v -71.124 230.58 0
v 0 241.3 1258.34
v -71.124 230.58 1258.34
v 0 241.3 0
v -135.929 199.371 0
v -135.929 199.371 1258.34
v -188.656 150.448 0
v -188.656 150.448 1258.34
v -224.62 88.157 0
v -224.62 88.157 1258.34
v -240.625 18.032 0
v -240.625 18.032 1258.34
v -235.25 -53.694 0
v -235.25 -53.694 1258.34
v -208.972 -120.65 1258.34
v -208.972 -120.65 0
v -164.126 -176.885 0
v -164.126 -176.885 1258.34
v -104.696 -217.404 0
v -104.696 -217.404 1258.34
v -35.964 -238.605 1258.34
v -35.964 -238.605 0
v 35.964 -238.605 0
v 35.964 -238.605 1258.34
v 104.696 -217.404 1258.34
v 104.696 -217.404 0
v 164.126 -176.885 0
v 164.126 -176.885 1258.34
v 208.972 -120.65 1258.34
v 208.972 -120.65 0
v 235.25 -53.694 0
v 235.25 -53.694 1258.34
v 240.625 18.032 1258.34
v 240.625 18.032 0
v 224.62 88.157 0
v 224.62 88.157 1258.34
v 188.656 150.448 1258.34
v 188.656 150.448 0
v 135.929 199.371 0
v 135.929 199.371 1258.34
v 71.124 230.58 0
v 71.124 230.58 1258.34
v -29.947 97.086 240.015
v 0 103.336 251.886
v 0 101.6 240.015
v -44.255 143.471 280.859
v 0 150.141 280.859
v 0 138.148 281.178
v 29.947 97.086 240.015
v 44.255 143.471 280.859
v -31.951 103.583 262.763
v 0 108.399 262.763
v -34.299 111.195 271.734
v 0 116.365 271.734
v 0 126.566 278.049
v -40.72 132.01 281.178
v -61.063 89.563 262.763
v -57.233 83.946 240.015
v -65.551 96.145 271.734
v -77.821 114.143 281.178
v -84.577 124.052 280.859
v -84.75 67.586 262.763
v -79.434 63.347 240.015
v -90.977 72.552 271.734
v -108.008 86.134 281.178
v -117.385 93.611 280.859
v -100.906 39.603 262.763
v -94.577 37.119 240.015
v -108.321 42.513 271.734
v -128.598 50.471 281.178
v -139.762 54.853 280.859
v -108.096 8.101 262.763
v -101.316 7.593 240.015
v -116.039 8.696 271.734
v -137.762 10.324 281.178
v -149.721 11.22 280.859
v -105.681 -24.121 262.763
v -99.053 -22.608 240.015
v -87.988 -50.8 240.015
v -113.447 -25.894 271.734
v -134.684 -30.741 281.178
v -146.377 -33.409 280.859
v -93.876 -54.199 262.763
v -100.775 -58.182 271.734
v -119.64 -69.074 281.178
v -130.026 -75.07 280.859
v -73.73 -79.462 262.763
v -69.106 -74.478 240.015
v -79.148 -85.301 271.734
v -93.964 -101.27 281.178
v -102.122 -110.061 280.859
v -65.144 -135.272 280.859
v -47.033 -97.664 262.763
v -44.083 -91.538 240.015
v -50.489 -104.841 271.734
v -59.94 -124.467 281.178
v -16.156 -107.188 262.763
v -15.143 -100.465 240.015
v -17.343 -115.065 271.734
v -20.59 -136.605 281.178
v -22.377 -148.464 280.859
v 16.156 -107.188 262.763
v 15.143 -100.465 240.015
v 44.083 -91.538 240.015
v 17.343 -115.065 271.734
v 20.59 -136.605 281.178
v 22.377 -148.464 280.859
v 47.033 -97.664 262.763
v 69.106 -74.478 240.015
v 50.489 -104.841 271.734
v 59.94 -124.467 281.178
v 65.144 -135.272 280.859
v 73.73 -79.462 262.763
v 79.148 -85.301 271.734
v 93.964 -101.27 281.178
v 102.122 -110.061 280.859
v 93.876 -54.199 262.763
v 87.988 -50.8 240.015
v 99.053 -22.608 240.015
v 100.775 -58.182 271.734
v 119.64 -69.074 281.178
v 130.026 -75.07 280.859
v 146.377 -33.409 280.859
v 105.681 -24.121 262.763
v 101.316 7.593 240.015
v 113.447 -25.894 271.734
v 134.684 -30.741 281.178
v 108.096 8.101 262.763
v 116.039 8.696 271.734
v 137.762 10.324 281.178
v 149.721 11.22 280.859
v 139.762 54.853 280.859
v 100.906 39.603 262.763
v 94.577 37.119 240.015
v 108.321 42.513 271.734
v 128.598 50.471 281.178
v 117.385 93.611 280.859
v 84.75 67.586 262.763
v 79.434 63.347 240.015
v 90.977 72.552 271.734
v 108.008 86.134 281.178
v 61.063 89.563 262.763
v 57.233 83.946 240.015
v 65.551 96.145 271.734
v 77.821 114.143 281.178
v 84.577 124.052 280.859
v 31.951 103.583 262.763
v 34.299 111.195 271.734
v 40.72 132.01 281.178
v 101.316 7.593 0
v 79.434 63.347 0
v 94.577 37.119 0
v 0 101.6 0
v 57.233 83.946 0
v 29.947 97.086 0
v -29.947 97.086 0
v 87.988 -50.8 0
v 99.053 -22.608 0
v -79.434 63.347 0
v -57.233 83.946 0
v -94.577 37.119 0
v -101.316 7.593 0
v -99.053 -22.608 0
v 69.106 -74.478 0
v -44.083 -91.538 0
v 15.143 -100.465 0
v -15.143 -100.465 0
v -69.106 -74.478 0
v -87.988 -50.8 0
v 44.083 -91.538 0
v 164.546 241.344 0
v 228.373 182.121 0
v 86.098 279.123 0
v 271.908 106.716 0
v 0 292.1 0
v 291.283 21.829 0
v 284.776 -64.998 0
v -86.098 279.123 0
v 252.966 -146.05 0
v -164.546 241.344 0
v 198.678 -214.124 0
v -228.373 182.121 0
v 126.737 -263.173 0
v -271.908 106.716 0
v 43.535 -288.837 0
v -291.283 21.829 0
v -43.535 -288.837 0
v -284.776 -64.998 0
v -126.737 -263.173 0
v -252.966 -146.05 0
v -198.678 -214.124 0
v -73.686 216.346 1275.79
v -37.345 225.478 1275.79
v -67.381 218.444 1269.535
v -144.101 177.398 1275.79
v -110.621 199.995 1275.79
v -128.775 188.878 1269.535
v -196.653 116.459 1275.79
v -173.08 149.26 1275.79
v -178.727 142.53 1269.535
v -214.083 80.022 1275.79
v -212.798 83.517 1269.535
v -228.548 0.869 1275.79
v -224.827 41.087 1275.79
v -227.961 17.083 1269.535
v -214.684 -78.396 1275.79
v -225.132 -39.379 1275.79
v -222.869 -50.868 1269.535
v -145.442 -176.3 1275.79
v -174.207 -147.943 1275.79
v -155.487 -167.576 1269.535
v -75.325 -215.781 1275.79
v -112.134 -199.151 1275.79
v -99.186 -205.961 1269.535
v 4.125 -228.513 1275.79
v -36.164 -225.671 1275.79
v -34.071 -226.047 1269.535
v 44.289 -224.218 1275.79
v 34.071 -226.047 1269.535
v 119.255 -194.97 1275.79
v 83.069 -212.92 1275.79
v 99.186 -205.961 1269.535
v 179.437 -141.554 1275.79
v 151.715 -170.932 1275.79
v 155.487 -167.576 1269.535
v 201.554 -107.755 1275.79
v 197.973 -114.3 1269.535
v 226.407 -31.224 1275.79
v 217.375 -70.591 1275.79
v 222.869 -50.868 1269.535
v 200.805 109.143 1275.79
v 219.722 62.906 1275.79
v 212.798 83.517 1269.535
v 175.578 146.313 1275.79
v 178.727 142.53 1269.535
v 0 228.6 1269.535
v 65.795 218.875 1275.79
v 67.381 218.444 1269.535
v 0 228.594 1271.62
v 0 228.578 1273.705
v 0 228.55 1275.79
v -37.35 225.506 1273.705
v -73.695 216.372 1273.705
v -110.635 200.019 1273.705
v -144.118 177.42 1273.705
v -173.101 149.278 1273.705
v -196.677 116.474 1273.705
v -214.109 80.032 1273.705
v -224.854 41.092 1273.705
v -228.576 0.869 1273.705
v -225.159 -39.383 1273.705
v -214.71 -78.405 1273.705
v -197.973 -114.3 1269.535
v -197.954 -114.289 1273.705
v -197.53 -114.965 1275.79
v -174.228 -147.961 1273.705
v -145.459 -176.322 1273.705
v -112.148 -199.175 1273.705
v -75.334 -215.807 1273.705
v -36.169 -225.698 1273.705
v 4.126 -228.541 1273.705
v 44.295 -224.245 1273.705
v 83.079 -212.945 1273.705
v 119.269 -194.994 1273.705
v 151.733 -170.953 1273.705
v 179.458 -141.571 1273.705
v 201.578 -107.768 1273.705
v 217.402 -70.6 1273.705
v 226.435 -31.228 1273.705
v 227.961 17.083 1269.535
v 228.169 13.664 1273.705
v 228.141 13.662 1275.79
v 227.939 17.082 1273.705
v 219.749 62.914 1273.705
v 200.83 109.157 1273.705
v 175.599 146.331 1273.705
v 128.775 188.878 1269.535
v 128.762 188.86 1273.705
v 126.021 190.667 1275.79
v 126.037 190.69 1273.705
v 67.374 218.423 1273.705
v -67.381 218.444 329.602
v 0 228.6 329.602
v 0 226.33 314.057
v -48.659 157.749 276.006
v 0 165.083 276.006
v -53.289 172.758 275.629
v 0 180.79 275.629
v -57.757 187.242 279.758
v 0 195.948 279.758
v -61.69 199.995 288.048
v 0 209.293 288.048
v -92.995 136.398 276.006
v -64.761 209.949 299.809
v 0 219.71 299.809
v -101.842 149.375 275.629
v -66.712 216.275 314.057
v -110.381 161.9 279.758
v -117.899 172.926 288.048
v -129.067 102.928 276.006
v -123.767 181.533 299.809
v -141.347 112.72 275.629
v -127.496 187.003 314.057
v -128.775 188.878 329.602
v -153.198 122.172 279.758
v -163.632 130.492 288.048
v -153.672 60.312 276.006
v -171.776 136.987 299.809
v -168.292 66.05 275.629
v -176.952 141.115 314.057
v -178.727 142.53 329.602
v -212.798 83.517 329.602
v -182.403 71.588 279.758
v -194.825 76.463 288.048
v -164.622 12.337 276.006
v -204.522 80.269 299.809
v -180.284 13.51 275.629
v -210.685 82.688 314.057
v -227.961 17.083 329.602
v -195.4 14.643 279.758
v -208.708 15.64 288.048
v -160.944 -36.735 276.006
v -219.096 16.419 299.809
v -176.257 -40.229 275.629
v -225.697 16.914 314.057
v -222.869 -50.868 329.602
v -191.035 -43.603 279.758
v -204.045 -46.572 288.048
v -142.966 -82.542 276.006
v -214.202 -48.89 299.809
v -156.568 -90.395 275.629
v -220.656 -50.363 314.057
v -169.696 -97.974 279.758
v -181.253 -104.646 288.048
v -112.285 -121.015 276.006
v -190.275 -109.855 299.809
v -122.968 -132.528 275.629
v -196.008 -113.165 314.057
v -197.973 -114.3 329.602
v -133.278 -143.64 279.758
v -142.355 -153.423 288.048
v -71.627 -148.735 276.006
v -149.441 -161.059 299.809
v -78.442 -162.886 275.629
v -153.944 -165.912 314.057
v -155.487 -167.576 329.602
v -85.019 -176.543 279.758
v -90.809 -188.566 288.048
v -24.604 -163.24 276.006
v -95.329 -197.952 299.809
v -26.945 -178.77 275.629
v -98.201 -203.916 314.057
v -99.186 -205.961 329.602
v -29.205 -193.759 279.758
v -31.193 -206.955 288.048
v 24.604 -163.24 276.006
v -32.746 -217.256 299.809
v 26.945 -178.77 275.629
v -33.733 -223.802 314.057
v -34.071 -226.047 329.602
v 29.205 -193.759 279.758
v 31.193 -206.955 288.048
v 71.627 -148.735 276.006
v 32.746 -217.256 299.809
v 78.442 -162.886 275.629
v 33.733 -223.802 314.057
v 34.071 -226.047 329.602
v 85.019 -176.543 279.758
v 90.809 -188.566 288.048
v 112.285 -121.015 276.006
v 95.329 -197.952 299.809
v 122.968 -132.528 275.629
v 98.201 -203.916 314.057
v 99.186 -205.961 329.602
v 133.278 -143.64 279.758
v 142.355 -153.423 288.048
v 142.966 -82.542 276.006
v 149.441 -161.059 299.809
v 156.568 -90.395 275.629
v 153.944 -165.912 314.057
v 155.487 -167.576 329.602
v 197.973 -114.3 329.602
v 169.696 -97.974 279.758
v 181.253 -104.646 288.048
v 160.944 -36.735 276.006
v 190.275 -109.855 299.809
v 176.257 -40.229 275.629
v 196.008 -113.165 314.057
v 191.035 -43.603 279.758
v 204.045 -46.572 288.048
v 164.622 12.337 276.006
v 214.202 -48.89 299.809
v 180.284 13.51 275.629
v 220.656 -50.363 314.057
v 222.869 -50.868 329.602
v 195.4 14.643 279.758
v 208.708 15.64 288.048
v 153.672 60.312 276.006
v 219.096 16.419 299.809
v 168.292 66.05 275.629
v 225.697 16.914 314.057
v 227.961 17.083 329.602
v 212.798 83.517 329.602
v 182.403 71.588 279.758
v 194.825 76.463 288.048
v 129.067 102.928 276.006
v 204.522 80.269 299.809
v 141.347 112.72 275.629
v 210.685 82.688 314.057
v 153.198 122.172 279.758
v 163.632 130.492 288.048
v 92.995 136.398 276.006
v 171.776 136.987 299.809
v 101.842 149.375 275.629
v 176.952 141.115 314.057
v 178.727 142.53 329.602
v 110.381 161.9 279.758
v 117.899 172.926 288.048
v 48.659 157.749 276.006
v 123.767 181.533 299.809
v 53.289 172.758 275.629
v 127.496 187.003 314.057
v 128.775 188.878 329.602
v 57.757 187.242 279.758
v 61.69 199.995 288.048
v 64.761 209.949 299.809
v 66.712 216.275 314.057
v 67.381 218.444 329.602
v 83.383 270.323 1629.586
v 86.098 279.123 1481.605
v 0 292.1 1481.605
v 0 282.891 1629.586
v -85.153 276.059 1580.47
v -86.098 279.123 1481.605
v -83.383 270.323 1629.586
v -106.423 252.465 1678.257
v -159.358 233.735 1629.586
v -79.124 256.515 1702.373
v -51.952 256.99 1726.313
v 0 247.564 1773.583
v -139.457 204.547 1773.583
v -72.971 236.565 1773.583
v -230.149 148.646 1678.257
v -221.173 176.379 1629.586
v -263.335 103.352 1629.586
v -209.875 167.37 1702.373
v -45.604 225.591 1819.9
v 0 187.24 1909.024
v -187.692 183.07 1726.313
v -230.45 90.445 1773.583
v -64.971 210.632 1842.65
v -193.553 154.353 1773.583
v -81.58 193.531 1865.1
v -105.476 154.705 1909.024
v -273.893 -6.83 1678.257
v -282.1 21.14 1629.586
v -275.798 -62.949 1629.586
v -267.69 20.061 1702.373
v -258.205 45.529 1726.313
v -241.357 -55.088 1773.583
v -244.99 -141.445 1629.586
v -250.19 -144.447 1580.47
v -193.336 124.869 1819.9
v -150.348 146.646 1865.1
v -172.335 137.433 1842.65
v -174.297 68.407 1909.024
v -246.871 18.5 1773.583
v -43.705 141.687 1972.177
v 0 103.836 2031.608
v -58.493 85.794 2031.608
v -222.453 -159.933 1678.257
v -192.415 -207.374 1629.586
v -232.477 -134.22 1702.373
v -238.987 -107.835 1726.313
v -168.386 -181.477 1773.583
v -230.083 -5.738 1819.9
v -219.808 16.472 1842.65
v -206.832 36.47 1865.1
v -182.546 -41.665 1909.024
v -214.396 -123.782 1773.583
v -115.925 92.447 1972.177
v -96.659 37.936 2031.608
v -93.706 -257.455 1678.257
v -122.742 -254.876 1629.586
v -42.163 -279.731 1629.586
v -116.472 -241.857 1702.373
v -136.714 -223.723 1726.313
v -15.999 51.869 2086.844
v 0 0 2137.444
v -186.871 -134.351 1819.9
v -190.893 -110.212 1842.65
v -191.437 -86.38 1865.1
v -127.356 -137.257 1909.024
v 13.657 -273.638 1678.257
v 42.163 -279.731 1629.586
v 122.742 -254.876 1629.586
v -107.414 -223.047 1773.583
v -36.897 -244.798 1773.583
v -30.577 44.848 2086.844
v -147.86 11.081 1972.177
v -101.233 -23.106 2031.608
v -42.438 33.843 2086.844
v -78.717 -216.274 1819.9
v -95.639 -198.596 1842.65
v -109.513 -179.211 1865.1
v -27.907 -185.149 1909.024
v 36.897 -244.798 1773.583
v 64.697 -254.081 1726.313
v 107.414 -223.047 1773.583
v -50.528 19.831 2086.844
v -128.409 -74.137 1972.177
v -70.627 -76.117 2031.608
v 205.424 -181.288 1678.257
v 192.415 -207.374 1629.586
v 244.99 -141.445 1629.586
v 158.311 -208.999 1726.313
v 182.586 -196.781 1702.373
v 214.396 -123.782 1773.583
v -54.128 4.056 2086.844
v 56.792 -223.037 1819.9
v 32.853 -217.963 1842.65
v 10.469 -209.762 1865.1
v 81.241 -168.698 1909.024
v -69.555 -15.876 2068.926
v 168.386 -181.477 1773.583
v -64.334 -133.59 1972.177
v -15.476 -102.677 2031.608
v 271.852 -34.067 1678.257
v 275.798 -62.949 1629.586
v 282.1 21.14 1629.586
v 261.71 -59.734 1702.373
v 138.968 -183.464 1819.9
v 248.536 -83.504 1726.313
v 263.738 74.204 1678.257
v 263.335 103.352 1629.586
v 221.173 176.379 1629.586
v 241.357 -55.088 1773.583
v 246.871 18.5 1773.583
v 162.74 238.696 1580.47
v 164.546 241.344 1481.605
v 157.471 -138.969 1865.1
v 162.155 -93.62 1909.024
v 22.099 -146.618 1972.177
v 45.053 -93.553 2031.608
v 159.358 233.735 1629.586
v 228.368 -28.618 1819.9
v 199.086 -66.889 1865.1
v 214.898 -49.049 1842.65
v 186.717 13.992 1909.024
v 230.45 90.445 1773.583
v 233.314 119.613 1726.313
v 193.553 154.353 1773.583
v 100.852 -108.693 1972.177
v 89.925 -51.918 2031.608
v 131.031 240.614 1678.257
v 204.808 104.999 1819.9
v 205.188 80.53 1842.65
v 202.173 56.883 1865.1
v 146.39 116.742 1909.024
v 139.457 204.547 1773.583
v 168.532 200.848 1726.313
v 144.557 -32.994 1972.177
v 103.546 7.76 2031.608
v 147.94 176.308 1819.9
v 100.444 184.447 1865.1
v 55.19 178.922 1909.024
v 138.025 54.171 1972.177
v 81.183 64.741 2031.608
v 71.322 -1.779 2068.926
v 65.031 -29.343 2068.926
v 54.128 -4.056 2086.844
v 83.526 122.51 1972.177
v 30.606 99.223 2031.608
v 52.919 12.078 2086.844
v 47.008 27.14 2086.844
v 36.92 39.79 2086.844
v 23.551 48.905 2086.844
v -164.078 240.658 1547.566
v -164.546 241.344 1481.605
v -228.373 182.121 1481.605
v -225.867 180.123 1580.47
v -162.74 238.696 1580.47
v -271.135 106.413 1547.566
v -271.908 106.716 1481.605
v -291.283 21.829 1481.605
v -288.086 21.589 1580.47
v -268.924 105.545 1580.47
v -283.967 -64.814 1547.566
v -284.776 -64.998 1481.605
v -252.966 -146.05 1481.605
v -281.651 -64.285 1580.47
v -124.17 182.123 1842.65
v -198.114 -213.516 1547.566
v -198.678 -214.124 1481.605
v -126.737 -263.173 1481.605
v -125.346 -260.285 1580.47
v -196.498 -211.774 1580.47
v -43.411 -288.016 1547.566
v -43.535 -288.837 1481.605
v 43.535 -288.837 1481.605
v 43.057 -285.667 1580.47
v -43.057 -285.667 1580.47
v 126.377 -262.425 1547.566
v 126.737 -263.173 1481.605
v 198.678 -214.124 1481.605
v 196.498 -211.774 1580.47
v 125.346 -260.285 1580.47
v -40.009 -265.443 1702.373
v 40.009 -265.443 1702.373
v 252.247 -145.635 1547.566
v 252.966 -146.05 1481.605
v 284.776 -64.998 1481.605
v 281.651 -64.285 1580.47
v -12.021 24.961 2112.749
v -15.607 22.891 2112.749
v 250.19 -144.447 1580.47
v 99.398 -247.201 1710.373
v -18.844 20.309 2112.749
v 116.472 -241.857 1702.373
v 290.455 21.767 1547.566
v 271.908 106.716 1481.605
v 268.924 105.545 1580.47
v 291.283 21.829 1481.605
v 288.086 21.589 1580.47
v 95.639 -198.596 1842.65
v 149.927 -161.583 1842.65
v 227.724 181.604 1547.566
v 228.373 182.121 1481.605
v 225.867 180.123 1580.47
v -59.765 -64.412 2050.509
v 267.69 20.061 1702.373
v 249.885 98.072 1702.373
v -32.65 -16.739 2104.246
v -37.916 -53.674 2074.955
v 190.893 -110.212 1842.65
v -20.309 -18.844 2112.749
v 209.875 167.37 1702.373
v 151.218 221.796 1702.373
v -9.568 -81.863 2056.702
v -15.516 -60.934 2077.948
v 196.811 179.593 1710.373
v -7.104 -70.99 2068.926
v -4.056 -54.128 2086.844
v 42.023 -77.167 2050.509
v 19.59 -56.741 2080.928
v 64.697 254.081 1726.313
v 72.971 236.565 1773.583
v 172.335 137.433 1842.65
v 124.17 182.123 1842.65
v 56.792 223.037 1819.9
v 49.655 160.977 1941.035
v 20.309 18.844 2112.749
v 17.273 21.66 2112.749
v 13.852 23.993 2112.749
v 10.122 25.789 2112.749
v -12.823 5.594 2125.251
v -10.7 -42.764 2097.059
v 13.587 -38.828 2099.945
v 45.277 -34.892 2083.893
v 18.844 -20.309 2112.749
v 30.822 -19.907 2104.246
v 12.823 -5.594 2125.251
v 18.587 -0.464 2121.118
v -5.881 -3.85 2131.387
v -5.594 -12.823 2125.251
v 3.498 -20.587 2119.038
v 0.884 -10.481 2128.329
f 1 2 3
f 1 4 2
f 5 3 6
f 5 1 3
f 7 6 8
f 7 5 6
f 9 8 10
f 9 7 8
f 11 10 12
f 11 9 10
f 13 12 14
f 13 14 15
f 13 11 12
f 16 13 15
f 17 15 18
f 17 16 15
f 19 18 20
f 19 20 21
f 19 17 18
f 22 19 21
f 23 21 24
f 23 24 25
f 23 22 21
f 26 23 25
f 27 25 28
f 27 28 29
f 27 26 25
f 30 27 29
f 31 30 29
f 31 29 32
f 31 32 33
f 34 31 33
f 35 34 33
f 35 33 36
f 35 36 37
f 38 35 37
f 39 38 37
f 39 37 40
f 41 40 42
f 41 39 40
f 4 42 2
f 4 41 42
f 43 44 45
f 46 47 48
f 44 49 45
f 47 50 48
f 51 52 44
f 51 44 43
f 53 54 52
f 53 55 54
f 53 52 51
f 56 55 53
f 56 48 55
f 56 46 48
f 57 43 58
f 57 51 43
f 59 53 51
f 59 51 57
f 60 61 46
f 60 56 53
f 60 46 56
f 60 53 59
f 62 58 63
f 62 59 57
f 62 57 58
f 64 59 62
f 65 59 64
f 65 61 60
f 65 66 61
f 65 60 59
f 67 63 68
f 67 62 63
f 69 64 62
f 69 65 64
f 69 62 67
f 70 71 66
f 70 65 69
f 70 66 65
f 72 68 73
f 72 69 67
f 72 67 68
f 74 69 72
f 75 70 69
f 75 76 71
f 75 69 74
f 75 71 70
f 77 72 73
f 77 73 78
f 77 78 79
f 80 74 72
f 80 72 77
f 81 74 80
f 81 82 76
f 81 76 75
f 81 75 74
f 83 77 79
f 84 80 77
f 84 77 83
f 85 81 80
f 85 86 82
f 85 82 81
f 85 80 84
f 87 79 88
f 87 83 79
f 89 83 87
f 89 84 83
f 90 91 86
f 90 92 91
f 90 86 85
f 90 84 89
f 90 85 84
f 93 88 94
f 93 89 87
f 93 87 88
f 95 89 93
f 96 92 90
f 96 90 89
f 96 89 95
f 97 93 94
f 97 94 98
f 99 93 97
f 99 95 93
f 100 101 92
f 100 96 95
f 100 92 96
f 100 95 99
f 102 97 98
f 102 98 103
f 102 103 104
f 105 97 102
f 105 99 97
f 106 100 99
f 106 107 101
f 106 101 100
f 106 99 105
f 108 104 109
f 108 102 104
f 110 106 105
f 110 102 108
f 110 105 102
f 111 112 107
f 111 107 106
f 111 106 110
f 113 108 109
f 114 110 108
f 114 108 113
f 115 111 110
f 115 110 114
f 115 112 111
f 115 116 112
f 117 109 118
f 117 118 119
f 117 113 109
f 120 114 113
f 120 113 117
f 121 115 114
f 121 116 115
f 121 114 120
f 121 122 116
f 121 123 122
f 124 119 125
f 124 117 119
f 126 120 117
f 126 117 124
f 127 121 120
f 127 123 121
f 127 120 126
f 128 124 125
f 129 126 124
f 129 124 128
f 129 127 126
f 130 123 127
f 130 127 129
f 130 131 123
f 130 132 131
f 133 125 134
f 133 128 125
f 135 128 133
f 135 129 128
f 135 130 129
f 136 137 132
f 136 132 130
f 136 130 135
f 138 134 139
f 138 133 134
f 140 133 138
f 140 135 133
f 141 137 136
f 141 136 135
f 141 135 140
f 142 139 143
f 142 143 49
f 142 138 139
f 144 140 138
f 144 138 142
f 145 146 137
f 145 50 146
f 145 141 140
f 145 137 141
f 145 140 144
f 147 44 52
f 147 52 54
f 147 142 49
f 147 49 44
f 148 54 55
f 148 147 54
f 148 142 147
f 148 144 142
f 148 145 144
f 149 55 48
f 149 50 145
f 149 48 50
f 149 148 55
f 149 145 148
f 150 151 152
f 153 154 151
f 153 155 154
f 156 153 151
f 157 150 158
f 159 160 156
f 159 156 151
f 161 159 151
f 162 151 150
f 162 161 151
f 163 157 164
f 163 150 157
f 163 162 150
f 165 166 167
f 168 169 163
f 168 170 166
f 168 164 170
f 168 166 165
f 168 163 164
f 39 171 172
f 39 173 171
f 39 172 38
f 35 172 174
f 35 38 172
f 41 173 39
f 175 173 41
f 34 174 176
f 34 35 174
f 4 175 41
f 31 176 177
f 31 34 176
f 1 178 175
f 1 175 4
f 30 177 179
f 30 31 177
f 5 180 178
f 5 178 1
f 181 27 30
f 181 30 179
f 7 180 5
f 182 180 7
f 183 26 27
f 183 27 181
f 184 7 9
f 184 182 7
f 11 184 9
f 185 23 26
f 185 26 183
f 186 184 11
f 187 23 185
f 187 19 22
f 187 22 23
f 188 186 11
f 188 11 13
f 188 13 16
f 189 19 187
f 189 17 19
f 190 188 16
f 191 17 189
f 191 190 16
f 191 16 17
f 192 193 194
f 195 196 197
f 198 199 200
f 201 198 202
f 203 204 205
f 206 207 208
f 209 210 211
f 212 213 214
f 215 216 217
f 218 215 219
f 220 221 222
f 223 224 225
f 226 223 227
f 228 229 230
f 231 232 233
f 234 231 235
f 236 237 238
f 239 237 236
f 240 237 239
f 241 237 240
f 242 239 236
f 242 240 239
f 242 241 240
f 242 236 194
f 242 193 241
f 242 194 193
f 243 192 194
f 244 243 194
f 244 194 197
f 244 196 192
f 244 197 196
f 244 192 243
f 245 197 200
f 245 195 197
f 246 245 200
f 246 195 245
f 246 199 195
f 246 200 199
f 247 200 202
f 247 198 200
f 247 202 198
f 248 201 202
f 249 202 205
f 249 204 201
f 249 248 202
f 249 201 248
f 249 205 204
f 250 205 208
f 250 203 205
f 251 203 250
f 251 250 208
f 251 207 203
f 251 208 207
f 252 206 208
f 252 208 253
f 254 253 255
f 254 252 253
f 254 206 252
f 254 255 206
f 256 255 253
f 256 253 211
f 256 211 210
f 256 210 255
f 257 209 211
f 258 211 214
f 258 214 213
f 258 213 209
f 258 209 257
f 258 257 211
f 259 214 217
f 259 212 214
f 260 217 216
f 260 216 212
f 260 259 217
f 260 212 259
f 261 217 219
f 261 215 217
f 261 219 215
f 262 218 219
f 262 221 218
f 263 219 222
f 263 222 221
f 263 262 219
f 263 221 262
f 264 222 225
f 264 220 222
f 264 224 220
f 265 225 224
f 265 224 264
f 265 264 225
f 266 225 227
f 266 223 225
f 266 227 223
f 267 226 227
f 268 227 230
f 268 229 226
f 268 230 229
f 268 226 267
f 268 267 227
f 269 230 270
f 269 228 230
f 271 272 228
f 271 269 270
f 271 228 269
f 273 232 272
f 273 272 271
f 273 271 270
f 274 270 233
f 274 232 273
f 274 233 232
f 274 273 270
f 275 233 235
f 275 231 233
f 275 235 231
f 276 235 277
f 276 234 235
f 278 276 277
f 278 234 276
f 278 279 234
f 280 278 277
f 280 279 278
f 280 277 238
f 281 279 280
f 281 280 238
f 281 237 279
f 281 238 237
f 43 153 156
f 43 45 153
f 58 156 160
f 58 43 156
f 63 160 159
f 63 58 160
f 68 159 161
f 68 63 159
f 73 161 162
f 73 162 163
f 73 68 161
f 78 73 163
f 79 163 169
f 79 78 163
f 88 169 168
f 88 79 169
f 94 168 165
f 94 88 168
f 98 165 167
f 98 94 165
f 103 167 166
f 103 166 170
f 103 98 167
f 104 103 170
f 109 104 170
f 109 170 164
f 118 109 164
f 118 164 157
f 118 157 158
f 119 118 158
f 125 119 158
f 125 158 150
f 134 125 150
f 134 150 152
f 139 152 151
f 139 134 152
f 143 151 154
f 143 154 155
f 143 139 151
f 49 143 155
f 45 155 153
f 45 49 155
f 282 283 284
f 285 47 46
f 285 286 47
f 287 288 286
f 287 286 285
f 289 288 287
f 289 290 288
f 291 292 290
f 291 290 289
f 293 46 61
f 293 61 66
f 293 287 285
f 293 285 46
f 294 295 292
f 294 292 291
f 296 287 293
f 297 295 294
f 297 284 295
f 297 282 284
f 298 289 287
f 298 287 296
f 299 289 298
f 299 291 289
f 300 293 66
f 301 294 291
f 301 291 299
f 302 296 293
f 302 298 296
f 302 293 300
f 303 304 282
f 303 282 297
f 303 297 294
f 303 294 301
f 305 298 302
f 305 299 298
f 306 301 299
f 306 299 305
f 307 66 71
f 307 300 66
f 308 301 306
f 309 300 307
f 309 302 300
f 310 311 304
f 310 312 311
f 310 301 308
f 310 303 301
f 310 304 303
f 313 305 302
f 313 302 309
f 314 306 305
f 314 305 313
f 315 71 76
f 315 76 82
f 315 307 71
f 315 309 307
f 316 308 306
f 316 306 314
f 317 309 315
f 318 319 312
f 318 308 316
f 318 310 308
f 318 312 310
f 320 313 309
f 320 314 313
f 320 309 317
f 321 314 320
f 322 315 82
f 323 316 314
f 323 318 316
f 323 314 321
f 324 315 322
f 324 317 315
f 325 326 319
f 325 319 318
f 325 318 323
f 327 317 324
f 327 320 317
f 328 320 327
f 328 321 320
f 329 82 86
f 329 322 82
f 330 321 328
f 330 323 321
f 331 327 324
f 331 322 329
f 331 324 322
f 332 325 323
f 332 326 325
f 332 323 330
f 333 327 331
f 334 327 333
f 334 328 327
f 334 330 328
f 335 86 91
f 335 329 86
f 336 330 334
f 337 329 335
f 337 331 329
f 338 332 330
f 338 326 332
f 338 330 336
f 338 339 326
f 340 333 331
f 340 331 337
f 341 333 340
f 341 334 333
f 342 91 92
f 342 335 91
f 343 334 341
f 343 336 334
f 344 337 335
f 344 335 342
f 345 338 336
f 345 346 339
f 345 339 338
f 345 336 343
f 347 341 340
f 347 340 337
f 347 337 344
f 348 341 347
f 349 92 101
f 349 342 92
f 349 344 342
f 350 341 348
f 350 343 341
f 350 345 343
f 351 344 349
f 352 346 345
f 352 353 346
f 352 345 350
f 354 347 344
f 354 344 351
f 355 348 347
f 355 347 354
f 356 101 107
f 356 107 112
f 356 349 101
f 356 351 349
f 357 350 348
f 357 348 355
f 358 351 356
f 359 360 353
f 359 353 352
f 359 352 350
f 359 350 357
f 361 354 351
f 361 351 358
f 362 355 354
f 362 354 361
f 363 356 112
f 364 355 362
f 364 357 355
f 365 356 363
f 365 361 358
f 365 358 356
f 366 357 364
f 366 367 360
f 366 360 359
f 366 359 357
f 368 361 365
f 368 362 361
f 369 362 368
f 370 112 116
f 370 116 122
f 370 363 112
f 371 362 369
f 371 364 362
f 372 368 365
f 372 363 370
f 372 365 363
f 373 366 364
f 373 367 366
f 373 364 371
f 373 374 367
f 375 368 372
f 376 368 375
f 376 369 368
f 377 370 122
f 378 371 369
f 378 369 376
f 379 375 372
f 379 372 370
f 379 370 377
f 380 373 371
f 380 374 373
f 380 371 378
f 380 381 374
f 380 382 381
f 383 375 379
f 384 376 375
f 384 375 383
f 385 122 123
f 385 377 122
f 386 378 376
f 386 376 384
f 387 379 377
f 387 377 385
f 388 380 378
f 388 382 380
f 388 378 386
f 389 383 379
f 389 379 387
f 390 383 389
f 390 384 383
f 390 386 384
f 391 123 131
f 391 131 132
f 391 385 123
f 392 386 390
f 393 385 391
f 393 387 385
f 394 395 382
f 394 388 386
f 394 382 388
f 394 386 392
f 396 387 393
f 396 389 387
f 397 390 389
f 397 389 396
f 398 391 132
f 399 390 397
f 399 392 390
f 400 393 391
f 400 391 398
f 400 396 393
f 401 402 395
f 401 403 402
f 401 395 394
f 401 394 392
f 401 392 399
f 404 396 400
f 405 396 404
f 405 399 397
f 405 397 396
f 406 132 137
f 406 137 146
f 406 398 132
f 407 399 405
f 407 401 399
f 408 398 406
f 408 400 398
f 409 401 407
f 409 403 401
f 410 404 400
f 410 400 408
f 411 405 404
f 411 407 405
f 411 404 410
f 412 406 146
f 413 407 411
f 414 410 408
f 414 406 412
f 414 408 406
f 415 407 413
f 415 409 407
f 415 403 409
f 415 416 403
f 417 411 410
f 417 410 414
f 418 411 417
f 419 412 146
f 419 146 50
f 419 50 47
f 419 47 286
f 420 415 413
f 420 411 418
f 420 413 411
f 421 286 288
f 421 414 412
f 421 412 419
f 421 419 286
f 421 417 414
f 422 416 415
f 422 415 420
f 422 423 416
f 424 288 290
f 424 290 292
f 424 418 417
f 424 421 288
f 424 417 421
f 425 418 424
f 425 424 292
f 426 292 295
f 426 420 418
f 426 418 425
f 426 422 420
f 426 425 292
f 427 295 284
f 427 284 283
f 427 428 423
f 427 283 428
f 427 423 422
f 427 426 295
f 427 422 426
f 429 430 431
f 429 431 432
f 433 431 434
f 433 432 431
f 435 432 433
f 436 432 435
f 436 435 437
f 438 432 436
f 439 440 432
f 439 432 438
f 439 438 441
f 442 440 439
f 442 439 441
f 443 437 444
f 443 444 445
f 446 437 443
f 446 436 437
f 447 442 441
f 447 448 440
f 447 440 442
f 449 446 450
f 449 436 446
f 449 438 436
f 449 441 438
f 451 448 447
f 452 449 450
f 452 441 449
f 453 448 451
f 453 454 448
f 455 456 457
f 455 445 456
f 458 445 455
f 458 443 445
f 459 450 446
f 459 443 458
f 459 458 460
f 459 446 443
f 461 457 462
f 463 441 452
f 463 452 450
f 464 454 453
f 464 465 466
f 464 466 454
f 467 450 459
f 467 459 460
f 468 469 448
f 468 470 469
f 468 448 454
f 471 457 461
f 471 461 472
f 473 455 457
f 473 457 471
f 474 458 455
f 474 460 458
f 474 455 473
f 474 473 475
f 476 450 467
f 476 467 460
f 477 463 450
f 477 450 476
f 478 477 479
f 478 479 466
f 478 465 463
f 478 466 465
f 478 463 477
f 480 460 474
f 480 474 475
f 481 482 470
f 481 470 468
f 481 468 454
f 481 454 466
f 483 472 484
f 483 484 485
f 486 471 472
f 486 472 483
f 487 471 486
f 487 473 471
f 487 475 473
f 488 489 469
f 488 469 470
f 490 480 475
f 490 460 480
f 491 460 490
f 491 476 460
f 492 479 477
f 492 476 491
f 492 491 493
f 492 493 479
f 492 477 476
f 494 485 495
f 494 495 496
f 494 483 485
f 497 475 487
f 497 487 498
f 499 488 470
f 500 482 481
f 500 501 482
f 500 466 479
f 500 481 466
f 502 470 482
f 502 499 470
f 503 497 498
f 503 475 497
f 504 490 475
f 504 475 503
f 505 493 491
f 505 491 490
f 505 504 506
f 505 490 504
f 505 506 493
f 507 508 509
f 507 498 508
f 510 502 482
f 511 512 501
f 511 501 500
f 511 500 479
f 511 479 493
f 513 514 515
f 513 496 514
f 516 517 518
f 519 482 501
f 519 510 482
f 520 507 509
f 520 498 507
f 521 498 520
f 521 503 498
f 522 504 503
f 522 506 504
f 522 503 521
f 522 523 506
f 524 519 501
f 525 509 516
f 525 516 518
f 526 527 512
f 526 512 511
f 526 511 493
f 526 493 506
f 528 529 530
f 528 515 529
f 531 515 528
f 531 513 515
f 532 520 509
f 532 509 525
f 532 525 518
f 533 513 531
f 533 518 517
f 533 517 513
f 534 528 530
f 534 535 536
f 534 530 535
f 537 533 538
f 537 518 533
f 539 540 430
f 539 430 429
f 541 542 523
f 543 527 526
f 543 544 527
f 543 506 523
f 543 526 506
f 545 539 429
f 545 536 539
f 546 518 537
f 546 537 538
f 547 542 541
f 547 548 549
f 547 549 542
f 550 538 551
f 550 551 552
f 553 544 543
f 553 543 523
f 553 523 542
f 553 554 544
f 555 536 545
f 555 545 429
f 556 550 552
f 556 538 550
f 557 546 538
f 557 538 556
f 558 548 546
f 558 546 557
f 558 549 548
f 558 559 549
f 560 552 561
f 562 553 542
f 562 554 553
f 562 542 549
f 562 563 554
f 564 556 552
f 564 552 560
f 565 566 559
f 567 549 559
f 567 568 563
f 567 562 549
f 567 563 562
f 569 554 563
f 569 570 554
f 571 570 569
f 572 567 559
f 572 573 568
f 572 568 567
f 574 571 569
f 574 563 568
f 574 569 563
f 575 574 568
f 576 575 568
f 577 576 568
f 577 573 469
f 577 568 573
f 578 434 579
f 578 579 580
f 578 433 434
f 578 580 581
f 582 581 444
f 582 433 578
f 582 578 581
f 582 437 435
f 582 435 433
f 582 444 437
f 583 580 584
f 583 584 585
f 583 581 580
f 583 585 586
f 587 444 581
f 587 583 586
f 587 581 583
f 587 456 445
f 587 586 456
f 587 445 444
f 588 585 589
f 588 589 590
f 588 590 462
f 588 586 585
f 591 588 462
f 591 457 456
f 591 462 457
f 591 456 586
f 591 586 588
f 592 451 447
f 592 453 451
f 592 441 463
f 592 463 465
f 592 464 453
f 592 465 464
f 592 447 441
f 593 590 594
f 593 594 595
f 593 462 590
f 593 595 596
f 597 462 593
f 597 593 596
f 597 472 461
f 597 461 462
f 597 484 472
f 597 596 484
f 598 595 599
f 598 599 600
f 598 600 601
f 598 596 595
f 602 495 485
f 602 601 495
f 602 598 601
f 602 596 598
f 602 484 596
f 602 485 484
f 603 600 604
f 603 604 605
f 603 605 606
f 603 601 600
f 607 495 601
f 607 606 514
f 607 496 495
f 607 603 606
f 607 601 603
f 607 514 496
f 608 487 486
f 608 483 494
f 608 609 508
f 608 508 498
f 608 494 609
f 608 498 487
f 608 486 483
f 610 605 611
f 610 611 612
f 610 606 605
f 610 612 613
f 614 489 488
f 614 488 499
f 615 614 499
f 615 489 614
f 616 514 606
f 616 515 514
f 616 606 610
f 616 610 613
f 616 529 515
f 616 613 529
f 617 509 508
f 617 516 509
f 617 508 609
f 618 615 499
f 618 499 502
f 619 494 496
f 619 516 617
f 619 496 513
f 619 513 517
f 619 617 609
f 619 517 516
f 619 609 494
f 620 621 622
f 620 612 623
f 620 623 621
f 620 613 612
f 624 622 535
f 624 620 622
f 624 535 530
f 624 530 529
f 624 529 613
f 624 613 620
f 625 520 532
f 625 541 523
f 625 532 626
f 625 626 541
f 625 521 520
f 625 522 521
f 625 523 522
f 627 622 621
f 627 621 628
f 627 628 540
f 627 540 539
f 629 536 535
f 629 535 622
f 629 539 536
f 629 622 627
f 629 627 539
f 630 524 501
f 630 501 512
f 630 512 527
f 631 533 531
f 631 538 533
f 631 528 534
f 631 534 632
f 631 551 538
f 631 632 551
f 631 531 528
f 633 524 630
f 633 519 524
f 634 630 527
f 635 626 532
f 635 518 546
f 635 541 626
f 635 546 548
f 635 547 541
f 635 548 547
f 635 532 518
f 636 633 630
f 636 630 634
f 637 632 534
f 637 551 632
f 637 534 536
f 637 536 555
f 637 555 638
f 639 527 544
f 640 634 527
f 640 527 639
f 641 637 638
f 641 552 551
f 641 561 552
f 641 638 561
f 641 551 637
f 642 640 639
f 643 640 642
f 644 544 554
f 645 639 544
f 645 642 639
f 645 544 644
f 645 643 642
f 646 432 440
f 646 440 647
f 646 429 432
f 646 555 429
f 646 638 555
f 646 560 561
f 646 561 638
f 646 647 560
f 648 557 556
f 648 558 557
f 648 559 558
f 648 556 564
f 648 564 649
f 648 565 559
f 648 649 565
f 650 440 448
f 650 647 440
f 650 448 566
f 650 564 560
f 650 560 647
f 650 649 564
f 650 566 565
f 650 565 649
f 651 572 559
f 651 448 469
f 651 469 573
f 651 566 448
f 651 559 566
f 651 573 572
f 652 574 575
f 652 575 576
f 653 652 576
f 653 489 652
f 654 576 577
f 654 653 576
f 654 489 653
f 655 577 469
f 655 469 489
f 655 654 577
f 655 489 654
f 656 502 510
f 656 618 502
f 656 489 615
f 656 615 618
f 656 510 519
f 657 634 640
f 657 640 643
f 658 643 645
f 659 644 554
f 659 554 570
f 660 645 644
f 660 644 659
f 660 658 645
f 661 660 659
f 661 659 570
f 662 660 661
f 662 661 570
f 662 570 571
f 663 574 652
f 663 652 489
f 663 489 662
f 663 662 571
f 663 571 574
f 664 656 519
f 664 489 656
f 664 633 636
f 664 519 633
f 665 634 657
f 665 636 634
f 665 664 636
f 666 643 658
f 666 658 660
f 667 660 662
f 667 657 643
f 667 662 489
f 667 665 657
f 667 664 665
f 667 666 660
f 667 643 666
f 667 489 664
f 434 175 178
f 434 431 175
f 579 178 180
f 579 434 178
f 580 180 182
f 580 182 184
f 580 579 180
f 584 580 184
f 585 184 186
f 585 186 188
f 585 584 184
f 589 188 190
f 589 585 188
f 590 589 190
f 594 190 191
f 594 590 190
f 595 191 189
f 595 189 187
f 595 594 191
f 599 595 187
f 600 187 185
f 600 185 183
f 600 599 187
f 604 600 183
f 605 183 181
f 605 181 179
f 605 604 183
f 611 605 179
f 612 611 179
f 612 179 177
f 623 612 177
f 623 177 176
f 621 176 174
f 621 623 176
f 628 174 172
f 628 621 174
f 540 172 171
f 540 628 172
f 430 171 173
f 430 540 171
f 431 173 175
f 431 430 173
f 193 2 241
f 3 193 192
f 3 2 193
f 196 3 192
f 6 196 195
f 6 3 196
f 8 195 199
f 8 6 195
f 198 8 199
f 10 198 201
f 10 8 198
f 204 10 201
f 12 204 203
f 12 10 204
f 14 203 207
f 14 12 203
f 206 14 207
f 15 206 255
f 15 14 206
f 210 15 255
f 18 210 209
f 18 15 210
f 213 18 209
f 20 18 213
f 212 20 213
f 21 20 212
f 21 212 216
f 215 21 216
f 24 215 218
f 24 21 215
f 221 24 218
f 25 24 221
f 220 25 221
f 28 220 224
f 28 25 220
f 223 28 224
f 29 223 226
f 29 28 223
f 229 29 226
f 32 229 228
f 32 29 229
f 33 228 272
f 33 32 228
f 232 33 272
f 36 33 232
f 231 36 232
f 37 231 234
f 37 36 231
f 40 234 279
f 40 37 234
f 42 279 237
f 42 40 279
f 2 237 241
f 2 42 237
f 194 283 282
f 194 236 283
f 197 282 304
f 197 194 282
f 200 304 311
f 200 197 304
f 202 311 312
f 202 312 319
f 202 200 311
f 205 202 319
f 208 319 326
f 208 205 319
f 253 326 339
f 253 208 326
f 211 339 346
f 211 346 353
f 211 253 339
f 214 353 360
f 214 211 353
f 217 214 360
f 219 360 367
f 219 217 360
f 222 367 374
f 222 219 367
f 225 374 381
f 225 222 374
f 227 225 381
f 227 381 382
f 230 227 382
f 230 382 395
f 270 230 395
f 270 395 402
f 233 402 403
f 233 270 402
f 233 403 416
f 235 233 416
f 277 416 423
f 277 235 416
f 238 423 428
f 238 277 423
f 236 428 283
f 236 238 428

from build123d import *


with BuildPart() as f1:
    # F0 (on Right) → F1 (revolve)
    with BuildSketch(Plane.YZ):
        with BuildLine():
            Line((0, 1625.6), (0, 0))
            Line((0, 0), (101.6, 0))
            Line((101.6, 0), (101.6, 240.015262))
            ThreePointArc((101.6, 240.015262), (116.364586, 271.734327), (150.140911, 280.858576))
            ThreePointArc((150.140911, 280.858576), (202.921417, 283.418504), (228.6, 329.602327))
            Line((228.6, 329.602327), (228.6, 1269.53539))
            ThreePointArc((228.6, 1269.53539), (166.531015, 1481.100963), (0, 1625.6))
        make_face()
    revolve(axis=Axis((0, 0, 812.8), (0, 0, 1)))

    # F2 (on Right) → F3 (revolve)
    with BuildSketch(Plane.YZ):
        with BuildLine():
            Line((0, 2137.444043), (0, 1588.585455))
            Line((0, 1588.585455), (241.3, 1258.340002))
            Line((241.3, 1258.340002), (241.3, 0))
            Line((241.3, 0), (292.1, 0))
            Line((292.1, 0), (292.1, 1481.604533))
            ThreePointArc((292.1, 1481.604533), (220.424698, 1842.64954), (0, 2137.444043))
        make_face()
    revolve(axis=Axis((0, 0, 1068.722021), (0, 0, 1)))


solid = f1.part
